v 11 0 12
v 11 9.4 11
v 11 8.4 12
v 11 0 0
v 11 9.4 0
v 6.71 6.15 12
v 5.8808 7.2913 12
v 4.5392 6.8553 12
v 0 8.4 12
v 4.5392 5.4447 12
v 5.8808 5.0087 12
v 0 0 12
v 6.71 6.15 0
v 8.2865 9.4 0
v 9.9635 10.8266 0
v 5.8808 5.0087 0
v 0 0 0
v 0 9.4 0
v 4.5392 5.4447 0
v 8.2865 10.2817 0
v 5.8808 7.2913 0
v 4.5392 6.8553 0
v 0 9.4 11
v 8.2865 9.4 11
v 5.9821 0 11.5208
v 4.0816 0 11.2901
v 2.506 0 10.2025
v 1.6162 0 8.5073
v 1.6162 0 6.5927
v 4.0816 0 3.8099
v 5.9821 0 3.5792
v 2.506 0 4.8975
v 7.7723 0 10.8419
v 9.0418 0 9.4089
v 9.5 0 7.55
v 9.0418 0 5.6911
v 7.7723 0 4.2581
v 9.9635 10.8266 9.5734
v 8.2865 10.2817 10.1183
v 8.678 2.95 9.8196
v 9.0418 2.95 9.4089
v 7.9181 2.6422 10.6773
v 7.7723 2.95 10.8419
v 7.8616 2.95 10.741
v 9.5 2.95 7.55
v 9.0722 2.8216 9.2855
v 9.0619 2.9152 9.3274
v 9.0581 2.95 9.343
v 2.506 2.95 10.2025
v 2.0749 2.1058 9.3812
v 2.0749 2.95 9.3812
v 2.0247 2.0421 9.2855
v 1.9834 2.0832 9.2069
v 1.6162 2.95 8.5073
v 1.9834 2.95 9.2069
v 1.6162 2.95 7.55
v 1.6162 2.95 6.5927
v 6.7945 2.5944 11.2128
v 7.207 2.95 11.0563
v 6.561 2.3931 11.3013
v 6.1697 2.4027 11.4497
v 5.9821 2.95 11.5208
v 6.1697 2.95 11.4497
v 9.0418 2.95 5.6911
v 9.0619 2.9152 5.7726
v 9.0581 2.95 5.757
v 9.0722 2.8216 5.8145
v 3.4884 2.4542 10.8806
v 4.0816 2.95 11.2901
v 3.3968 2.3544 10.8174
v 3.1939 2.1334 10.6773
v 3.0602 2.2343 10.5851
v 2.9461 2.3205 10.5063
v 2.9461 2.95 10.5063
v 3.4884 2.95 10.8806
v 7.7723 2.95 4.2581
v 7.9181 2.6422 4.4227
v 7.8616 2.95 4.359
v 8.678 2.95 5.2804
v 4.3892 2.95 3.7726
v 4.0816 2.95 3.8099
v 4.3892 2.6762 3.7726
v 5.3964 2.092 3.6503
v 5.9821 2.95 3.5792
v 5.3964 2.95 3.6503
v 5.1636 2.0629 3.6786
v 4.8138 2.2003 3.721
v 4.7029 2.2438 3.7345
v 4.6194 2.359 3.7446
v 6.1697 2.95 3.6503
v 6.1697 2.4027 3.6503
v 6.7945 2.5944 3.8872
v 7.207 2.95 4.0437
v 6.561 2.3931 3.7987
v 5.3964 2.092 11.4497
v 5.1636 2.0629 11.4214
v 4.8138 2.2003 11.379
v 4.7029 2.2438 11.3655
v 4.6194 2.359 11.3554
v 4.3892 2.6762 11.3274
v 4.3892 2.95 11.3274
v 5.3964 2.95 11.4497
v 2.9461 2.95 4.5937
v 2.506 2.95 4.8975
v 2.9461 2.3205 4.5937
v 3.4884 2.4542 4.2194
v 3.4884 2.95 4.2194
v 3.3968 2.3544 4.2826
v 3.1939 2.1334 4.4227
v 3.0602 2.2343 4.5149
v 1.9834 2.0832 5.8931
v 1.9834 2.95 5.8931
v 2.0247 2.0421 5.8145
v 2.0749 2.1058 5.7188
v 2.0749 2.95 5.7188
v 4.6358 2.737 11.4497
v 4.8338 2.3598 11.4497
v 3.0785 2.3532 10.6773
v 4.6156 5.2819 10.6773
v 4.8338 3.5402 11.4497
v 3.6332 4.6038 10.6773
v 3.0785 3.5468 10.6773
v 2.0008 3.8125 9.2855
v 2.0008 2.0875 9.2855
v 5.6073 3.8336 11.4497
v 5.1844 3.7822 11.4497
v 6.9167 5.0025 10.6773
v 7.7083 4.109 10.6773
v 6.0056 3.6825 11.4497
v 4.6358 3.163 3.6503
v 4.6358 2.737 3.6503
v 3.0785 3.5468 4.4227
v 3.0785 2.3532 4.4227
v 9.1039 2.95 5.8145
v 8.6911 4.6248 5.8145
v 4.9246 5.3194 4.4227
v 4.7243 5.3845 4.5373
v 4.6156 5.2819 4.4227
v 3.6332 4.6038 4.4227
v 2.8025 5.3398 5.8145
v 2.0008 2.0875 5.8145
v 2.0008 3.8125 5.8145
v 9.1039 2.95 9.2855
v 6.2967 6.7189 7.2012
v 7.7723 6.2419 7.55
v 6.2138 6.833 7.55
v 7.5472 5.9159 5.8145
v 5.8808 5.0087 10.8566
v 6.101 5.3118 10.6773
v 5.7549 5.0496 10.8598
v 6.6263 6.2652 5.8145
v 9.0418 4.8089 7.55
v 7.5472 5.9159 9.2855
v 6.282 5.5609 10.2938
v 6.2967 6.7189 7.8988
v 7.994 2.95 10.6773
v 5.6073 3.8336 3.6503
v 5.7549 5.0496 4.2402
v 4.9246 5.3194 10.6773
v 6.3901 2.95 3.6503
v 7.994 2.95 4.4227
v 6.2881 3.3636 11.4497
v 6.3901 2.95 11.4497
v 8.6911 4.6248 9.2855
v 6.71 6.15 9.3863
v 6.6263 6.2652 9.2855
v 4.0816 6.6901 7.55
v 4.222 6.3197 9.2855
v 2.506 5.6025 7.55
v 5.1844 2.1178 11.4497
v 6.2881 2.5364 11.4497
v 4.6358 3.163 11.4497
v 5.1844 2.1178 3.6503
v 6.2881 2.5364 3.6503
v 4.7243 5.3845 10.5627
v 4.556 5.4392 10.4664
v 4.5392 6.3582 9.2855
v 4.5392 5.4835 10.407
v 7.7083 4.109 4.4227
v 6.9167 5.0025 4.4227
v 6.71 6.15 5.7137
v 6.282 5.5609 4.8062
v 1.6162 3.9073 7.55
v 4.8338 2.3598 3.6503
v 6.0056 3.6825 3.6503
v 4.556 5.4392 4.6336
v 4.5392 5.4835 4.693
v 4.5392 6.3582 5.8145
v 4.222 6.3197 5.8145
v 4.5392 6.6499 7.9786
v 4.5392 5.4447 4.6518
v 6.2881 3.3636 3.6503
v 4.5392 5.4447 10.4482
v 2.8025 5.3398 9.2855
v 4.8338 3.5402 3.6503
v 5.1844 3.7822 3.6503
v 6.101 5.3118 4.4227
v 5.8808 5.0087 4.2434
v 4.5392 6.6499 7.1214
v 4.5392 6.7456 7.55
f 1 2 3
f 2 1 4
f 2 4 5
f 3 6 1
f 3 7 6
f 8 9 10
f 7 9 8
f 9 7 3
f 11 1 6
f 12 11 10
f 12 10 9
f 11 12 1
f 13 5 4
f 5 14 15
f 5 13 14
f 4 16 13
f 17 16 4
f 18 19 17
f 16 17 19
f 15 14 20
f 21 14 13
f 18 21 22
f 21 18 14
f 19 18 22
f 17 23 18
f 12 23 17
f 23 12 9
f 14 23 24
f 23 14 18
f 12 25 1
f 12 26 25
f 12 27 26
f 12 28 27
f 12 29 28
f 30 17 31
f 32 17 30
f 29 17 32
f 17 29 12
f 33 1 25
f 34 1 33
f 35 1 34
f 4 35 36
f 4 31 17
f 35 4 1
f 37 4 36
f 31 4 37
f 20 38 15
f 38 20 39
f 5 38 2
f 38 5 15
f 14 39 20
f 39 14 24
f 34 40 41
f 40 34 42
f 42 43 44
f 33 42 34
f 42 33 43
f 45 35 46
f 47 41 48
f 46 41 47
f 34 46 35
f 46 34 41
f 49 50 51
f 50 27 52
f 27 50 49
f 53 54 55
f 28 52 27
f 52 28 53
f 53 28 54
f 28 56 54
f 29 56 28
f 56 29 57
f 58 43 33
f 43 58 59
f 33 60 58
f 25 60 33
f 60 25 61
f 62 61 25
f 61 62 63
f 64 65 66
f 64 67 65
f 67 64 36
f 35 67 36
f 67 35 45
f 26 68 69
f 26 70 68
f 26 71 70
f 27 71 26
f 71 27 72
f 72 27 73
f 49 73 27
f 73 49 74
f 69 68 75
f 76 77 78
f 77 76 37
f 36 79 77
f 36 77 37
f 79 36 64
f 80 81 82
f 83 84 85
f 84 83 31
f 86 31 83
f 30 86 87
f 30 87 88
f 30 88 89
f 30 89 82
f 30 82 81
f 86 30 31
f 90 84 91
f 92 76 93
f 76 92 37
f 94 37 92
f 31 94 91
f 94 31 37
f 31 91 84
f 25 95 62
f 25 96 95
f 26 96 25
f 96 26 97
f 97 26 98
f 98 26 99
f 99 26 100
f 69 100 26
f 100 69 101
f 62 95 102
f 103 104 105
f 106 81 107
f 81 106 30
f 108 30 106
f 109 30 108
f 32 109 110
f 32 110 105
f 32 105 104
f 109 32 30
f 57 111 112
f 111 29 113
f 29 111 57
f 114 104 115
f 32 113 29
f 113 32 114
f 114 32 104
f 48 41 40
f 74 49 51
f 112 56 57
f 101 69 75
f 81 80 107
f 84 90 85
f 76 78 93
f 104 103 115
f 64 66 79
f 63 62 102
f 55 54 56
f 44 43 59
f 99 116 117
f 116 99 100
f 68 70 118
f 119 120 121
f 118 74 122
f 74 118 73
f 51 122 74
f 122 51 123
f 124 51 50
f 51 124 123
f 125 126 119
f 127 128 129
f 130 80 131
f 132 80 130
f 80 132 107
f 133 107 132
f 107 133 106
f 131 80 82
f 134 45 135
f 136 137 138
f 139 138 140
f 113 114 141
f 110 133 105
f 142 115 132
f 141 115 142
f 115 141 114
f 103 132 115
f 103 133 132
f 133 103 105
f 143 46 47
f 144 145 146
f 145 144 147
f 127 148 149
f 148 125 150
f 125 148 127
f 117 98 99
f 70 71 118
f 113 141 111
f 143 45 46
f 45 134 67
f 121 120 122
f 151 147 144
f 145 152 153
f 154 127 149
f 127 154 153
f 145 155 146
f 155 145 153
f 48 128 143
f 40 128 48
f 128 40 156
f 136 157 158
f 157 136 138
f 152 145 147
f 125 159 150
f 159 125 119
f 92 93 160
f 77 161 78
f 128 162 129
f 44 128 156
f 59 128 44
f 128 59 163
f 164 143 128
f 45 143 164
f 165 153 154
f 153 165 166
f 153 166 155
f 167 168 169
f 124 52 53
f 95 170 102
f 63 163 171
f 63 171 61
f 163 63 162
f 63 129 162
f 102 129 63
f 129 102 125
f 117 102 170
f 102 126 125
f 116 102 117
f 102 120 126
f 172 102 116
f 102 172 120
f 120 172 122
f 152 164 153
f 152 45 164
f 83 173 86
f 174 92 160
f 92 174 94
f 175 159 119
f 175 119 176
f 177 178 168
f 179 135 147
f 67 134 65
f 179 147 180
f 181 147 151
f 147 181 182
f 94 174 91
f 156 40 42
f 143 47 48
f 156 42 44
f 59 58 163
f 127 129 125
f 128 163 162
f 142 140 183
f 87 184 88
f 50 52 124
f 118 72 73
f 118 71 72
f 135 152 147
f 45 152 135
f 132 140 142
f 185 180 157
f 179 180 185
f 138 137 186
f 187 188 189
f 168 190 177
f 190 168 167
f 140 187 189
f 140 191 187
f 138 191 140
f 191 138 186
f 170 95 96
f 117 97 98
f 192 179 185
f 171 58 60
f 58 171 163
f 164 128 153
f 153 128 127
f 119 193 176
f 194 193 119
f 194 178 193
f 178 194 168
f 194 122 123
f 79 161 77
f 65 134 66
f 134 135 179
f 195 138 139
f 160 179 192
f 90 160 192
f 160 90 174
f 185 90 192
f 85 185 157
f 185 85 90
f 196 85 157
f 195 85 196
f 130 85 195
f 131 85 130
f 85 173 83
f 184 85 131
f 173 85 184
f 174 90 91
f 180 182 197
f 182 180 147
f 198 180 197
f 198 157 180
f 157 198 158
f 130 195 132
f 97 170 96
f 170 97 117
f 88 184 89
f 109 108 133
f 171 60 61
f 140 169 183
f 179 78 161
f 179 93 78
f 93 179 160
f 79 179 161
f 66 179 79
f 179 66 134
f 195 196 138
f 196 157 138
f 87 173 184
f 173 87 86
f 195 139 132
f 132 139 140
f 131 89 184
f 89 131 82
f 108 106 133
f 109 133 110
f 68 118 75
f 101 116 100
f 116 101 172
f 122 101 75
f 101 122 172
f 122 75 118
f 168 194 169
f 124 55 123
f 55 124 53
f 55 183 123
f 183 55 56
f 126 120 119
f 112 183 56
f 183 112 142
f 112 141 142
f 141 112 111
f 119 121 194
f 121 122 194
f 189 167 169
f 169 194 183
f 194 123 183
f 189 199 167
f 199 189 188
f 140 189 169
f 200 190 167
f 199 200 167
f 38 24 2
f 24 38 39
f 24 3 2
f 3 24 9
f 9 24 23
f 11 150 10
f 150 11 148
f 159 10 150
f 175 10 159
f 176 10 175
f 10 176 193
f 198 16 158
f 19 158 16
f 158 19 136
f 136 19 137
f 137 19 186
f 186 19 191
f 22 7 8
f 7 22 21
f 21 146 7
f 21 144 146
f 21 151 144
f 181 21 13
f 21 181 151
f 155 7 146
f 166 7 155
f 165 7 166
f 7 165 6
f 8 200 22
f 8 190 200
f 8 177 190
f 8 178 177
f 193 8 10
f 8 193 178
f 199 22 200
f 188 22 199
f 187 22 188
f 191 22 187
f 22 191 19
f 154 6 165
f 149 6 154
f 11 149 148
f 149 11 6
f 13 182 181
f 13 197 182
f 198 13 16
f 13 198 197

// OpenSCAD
// PIRANHA iteration1
// adapter-printer
// GNU GPL v3
// Usan Siriwardana <usiriwar@uwaterloo.ca> and contributors
// based on Prusa i3 MK3S
// https://reprap.org/wiki/Prusa_i3_MK3

difference(){
	// base
	union(){
		cube([11, 9.4, 12]);
		translate([11-1.5, 9.4, 0])cylinder(h = 12, r = 1.5);
	}
	// 1mm chamfer
	translate([-0.5, 12, 9.4 -1])rotate([45, 0, 0])cube([13, 5, 10]);
	
	// fillament hole
	translate([5.51, 6.15, -0.5])cylinder(h = 13, r = 1.2, center = false); 
	
	// ball bearing cavity
	translate([5.5, 2.95, 7.55]){
		rotate([90, 0, 0])cylinder(h=3, r=4);
		sphere(4);	
	}
}
